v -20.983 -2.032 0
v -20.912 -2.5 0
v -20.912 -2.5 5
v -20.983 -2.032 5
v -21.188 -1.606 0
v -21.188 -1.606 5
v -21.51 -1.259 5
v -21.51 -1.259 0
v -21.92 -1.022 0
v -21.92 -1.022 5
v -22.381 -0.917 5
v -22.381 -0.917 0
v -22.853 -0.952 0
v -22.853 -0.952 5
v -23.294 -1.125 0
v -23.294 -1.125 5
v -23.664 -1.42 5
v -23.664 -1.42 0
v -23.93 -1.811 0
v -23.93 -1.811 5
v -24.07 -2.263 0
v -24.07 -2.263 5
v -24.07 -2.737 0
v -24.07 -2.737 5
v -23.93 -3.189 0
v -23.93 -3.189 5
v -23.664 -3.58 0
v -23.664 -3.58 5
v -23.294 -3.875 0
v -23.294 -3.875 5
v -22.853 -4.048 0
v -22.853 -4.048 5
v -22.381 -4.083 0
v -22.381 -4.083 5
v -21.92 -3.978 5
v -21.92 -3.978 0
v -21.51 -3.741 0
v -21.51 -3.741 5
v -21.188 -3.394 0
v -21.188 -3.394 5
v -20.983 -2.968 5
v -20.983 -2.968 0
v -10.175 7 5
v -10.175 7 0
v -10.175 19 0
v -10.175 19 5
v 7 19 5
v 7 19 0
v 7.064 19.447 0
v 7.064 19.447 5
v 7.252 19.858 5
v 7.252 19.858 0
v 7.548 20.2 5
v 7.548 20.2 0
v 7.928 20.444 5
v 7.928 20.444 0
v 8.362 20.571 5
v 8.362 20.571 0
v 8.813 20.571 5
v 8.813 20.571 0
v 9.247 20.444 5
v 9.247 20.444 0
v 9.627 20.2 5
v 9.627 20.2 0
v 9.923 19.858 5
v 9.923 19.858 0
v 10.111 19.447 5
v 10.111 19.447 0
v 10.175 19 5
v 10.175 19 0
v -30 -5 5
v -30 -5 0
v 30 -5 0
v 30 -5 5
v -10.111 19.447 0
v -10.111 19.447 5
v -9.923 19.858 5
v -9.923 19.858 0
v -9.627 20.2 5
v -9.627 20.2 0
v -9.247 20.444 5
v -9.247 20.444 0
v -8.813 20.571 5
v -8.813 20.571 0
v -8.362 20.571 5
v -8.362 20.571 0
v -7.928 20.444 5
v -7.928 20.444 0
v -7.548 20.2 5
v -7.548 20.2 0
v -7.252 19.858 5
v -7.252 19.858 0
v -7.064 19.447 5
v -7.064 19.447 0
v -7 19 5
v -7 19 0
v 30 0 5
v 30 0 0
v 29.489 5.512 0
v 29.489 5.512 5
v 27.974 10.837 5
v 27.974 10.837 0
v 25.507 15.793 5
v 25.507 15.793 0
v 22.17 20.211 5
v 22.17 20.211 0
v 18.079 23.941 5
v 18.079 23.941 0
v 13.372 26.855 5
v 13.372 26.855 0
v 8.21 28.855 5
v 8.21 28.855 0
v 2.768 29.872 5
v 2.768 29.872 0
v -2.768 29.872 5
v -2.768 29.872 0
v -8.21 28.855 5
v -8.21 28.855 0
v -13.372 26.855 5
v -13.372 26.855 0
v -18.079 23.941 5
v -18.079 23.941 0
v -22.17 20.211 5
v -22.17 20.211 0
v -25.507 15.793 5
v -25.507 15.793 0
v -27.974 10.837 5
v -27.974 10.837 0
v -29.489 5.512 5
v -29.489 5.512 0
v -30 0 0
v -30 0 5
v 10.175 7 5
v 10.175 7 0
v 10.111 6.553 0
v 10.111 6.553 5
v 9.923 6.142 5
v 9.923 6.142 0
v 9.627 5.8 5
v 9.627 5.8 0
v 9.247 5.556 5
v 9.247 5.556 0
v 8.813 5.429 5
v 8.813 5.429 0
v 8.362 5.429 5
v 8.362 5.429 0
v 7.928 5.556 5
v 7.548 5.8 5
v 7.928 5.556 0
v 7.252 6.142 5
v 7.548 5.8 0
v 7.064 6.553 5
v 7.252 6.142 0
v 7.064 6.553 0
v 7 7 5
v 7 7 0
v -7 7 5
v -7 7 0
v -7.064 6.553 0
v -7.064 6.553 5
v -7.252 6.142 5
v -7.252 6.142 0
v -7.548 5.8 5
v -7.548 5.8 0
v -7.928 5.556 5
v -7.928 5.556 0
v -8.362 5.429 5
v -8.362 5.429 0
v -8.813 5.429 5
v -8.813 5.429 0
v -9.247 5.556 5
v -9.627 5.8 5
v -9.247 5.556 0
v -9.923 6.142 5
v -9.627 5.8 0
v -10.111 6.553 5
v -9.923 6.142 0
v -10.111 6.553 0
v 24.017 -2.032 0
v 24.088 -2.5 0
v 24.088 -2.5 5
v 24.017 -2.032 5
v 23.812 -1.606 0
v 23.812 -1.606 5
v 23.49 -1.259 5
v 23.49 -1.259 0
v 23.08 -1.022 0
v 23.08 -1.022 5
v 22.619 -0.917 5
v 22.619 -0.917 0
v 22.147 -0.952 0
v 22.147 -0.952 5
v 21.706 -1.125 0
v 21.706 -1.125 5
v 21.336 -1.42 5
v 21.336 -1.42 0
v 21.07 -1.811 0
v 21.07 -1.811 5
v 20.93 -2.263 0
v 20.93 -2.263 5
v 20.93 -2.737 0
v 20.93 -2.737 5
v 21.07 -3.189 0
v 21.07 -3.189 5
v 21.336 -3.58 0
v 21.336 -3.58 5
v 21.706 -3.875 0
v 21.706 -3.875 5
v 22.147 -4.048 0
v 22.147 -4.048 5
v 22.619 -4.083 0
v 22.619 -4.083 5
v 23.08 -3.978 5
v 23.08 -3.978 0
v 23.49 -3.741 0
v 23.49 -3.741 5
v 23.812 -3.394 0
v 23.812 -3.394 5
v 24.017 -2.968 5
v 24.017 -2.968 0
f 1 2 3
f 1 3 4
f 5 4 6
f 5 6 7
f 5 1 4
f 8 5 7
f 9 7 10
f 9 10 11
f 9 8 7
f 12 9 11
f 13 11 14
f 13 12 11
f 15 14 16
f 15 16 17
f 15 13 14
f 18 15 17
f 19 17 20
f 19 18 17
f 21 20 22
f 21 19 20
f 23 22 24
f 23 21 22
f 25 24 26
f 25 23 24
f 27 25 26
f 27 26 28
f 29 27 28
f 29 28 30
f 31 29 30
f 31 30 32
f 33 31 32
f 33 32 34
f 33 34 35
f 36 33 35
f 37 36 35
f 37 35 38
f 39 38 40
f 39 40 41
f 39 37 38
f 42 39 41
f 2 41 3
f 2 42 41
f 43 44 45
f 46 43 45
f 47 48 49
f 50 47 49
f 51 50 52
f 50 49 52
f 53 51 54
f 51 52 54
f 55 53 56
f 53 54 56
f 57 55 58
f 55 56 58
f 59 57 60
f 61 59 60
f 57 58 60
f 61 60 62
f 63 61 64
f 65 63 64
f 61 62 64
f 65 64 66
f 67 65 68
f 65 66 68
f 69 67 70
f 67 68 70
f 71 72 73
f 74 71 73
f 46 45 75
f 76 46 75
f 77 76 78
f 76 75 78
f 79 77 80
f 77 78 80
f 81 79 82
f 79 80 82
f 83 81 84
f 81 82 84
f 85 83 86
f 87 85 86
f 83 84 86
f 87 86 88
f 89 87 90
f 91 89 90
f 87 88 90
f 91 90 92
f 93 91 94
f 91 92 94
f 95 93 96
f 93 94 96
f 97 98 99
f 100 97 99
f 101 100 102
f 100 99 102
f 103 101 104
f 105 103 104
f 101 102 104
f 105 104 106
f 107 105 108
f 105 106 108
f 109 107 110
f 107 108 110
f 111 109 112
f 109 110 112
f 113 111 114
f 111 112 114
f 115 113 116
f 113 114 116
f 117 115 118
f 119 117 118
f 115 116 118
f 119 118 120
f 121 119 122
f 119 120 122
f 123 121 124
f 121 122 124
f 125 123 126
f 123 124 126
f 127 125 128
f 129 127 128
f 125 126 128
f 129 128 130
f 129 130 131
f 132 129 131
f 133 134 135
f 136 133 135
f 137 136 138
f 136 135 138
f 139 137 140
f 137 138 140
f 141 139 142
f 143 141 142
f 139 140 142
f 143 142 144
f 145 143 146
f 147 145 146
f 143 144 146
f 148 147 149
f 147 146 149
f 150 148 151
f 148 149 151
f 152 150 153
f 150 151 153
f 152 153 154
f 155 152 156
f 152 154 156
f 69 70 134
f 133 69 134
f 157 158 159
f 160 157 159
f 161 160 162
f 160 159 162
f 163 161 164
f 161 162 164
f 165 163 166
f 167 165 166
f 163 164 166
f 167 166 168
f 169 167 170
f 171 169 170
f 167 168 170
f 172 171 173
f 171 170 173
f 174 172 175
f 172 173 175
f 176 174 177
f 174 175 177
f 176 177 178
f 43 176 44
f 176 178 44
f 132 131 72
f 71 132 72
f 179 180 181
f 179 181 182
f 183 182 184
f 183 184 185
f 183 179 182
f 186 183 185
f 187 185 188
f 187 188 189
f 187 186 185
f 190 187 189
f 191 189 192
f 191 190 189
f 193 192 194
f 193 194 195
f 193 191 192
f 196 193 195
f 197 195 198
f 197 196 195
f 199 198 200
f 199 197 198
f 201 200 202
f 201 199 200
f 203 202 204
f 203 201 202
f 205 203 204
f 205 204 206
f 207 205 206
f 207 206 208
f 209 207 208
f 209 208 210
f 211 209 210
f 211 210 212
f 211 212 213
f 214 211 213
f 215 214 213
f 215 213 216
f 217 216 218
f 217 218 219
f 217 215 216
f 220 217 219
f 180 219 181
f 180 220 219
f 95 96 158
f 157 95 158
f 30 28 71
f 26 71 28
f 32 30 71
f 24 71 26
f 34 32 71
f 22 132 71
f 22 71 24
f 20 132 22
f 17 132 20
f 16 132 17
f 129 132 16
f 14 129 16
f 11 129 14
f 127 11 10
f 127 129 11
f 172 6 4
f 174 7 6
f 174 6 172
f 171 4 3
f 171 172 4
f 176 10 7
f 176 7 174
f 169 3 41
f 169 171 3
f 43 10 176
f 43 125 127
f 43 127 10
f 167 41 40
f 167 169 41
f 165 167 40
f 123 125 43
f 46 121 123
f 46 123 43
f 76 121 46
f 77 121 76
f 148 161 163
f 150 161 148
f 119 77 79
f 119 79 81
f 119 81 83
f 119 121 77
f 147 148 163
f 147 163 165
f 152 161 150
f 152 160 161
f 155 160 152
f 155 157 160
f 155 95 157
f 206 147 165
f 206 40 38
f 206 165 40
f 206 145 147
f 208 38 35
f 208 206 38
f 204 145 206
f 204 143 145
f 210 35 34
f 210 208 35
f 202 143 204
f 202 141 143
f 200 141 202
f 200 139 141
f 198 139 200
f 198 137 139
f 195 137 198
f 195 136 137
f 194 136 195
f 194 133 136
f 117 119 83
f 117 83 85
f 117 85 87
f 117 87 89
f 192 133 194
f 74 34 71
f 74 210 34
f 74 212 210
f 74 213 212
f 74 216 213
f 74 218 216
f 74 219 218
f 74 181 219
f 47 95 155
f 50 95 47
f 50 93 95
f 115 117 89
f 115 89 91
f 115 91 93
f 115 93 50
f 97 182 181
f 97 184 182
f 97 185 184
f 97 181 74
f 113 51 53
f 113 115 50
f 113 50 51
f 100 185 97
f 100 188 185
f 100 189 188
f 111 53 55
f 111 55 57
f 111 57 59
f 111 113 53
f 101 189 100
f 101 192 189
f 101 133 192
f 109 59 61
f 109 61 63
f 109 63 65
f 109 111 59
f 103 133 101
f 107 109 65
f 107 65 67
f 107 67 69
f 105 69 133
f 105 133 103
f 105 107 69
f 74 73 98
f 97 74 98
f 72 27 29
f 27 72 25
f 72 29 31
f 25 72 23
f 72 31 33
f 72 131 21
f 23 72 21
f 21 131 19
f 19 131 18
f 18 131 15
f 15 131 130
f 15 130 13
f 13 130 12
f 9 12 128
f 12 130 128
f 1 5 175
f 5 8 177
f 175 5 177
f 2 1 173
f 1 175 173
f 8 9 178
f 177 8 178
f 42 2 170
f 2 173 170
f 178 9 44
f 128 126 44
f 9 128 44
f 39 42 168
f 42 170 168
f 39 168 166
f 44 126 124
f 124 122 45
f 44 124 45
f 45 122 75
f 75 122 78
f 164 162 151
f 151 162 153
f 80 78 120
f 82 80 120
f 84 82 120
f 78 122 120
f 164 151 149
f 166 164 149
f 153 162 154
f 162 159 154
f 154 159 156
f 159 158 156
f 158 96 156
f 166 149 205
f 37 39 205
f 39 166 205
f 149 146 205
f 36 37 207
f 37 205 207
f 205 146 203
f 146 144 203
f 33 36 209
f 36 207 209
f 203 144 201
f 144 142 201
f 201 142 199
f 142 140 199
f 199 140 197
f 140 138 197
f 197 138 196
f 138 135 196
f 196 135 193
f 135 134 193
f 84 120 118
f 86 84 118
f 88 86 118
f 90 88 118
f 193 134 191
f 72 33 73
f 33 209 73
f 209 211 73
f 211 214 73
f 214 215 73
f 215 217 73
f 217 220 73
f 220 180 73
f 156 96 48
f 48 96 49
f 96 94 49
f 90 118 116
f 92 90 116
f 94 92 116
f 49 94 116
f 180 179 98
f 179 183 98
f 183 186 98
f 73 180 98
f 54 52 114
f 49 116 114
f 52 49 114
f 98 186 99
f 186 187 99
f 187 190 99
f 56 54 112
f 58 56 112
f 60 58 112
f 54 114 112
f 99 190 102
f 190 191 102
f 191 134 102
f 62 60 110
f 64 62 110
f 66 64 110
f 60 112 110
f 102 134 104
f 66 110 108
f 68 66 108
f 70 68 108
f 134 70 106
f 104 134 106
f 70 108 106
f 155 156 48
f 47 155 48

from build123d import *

# Parameters (mm, degrees)
CROQUIS1_R              = 1.5875
SALIENTE_EXTRUIR1_DEPTH = 5


with BuildPart() as part:
    # Croquis1 → Saliente-Extruir1 (new body)
    with BuildSketch(Plane.XY):
        with BuildLine():
            Line((-30, 0), (-30, -5))
            Line((-30, -5), (30, -5))
            Line((30, -5), (30, 0))
            ThreePointArc((30, 0), (0, 30), (-30, 0))
        make_face()
        with Locations((-22.5, -2.5)):
            Circle(CROQUIS1_R, mode=Mode.SUBTRACT)
        with Locations((22.5, -2.5)):
            Circle(CROQUIS1_R, mode=Mode.SUBTRACT)
        with BuildLine():
            Line((-10.175, 7), (-10.175, 19))
            ThreePointArc((-10.175, 19), (-8.5875, 20.5875), (-7, 19))
            Line((-7, 19), (-7, 7))
            ThreePointArc((-7, 7), (-8.5875, 5.4125), (-10.175, 7))
        make_face(mode=Mode.SUBTRACT)
        with BuildLine():
            Line((7, 7), (7, 19))
            ThreePointArc((7, 19), (8.5875, 20.5875), (10.175, 19))
            Line((10.175, 19), (10.175, 7))
            ThreePointArc((10.175, 7), (8.5875, 5.4125), (7, 7))
        make_face(mode=Mode.SUBTRACT)
    extrude(amount=SALIENTE_EXTRUIR1_DEPTH)


solid = part.part
